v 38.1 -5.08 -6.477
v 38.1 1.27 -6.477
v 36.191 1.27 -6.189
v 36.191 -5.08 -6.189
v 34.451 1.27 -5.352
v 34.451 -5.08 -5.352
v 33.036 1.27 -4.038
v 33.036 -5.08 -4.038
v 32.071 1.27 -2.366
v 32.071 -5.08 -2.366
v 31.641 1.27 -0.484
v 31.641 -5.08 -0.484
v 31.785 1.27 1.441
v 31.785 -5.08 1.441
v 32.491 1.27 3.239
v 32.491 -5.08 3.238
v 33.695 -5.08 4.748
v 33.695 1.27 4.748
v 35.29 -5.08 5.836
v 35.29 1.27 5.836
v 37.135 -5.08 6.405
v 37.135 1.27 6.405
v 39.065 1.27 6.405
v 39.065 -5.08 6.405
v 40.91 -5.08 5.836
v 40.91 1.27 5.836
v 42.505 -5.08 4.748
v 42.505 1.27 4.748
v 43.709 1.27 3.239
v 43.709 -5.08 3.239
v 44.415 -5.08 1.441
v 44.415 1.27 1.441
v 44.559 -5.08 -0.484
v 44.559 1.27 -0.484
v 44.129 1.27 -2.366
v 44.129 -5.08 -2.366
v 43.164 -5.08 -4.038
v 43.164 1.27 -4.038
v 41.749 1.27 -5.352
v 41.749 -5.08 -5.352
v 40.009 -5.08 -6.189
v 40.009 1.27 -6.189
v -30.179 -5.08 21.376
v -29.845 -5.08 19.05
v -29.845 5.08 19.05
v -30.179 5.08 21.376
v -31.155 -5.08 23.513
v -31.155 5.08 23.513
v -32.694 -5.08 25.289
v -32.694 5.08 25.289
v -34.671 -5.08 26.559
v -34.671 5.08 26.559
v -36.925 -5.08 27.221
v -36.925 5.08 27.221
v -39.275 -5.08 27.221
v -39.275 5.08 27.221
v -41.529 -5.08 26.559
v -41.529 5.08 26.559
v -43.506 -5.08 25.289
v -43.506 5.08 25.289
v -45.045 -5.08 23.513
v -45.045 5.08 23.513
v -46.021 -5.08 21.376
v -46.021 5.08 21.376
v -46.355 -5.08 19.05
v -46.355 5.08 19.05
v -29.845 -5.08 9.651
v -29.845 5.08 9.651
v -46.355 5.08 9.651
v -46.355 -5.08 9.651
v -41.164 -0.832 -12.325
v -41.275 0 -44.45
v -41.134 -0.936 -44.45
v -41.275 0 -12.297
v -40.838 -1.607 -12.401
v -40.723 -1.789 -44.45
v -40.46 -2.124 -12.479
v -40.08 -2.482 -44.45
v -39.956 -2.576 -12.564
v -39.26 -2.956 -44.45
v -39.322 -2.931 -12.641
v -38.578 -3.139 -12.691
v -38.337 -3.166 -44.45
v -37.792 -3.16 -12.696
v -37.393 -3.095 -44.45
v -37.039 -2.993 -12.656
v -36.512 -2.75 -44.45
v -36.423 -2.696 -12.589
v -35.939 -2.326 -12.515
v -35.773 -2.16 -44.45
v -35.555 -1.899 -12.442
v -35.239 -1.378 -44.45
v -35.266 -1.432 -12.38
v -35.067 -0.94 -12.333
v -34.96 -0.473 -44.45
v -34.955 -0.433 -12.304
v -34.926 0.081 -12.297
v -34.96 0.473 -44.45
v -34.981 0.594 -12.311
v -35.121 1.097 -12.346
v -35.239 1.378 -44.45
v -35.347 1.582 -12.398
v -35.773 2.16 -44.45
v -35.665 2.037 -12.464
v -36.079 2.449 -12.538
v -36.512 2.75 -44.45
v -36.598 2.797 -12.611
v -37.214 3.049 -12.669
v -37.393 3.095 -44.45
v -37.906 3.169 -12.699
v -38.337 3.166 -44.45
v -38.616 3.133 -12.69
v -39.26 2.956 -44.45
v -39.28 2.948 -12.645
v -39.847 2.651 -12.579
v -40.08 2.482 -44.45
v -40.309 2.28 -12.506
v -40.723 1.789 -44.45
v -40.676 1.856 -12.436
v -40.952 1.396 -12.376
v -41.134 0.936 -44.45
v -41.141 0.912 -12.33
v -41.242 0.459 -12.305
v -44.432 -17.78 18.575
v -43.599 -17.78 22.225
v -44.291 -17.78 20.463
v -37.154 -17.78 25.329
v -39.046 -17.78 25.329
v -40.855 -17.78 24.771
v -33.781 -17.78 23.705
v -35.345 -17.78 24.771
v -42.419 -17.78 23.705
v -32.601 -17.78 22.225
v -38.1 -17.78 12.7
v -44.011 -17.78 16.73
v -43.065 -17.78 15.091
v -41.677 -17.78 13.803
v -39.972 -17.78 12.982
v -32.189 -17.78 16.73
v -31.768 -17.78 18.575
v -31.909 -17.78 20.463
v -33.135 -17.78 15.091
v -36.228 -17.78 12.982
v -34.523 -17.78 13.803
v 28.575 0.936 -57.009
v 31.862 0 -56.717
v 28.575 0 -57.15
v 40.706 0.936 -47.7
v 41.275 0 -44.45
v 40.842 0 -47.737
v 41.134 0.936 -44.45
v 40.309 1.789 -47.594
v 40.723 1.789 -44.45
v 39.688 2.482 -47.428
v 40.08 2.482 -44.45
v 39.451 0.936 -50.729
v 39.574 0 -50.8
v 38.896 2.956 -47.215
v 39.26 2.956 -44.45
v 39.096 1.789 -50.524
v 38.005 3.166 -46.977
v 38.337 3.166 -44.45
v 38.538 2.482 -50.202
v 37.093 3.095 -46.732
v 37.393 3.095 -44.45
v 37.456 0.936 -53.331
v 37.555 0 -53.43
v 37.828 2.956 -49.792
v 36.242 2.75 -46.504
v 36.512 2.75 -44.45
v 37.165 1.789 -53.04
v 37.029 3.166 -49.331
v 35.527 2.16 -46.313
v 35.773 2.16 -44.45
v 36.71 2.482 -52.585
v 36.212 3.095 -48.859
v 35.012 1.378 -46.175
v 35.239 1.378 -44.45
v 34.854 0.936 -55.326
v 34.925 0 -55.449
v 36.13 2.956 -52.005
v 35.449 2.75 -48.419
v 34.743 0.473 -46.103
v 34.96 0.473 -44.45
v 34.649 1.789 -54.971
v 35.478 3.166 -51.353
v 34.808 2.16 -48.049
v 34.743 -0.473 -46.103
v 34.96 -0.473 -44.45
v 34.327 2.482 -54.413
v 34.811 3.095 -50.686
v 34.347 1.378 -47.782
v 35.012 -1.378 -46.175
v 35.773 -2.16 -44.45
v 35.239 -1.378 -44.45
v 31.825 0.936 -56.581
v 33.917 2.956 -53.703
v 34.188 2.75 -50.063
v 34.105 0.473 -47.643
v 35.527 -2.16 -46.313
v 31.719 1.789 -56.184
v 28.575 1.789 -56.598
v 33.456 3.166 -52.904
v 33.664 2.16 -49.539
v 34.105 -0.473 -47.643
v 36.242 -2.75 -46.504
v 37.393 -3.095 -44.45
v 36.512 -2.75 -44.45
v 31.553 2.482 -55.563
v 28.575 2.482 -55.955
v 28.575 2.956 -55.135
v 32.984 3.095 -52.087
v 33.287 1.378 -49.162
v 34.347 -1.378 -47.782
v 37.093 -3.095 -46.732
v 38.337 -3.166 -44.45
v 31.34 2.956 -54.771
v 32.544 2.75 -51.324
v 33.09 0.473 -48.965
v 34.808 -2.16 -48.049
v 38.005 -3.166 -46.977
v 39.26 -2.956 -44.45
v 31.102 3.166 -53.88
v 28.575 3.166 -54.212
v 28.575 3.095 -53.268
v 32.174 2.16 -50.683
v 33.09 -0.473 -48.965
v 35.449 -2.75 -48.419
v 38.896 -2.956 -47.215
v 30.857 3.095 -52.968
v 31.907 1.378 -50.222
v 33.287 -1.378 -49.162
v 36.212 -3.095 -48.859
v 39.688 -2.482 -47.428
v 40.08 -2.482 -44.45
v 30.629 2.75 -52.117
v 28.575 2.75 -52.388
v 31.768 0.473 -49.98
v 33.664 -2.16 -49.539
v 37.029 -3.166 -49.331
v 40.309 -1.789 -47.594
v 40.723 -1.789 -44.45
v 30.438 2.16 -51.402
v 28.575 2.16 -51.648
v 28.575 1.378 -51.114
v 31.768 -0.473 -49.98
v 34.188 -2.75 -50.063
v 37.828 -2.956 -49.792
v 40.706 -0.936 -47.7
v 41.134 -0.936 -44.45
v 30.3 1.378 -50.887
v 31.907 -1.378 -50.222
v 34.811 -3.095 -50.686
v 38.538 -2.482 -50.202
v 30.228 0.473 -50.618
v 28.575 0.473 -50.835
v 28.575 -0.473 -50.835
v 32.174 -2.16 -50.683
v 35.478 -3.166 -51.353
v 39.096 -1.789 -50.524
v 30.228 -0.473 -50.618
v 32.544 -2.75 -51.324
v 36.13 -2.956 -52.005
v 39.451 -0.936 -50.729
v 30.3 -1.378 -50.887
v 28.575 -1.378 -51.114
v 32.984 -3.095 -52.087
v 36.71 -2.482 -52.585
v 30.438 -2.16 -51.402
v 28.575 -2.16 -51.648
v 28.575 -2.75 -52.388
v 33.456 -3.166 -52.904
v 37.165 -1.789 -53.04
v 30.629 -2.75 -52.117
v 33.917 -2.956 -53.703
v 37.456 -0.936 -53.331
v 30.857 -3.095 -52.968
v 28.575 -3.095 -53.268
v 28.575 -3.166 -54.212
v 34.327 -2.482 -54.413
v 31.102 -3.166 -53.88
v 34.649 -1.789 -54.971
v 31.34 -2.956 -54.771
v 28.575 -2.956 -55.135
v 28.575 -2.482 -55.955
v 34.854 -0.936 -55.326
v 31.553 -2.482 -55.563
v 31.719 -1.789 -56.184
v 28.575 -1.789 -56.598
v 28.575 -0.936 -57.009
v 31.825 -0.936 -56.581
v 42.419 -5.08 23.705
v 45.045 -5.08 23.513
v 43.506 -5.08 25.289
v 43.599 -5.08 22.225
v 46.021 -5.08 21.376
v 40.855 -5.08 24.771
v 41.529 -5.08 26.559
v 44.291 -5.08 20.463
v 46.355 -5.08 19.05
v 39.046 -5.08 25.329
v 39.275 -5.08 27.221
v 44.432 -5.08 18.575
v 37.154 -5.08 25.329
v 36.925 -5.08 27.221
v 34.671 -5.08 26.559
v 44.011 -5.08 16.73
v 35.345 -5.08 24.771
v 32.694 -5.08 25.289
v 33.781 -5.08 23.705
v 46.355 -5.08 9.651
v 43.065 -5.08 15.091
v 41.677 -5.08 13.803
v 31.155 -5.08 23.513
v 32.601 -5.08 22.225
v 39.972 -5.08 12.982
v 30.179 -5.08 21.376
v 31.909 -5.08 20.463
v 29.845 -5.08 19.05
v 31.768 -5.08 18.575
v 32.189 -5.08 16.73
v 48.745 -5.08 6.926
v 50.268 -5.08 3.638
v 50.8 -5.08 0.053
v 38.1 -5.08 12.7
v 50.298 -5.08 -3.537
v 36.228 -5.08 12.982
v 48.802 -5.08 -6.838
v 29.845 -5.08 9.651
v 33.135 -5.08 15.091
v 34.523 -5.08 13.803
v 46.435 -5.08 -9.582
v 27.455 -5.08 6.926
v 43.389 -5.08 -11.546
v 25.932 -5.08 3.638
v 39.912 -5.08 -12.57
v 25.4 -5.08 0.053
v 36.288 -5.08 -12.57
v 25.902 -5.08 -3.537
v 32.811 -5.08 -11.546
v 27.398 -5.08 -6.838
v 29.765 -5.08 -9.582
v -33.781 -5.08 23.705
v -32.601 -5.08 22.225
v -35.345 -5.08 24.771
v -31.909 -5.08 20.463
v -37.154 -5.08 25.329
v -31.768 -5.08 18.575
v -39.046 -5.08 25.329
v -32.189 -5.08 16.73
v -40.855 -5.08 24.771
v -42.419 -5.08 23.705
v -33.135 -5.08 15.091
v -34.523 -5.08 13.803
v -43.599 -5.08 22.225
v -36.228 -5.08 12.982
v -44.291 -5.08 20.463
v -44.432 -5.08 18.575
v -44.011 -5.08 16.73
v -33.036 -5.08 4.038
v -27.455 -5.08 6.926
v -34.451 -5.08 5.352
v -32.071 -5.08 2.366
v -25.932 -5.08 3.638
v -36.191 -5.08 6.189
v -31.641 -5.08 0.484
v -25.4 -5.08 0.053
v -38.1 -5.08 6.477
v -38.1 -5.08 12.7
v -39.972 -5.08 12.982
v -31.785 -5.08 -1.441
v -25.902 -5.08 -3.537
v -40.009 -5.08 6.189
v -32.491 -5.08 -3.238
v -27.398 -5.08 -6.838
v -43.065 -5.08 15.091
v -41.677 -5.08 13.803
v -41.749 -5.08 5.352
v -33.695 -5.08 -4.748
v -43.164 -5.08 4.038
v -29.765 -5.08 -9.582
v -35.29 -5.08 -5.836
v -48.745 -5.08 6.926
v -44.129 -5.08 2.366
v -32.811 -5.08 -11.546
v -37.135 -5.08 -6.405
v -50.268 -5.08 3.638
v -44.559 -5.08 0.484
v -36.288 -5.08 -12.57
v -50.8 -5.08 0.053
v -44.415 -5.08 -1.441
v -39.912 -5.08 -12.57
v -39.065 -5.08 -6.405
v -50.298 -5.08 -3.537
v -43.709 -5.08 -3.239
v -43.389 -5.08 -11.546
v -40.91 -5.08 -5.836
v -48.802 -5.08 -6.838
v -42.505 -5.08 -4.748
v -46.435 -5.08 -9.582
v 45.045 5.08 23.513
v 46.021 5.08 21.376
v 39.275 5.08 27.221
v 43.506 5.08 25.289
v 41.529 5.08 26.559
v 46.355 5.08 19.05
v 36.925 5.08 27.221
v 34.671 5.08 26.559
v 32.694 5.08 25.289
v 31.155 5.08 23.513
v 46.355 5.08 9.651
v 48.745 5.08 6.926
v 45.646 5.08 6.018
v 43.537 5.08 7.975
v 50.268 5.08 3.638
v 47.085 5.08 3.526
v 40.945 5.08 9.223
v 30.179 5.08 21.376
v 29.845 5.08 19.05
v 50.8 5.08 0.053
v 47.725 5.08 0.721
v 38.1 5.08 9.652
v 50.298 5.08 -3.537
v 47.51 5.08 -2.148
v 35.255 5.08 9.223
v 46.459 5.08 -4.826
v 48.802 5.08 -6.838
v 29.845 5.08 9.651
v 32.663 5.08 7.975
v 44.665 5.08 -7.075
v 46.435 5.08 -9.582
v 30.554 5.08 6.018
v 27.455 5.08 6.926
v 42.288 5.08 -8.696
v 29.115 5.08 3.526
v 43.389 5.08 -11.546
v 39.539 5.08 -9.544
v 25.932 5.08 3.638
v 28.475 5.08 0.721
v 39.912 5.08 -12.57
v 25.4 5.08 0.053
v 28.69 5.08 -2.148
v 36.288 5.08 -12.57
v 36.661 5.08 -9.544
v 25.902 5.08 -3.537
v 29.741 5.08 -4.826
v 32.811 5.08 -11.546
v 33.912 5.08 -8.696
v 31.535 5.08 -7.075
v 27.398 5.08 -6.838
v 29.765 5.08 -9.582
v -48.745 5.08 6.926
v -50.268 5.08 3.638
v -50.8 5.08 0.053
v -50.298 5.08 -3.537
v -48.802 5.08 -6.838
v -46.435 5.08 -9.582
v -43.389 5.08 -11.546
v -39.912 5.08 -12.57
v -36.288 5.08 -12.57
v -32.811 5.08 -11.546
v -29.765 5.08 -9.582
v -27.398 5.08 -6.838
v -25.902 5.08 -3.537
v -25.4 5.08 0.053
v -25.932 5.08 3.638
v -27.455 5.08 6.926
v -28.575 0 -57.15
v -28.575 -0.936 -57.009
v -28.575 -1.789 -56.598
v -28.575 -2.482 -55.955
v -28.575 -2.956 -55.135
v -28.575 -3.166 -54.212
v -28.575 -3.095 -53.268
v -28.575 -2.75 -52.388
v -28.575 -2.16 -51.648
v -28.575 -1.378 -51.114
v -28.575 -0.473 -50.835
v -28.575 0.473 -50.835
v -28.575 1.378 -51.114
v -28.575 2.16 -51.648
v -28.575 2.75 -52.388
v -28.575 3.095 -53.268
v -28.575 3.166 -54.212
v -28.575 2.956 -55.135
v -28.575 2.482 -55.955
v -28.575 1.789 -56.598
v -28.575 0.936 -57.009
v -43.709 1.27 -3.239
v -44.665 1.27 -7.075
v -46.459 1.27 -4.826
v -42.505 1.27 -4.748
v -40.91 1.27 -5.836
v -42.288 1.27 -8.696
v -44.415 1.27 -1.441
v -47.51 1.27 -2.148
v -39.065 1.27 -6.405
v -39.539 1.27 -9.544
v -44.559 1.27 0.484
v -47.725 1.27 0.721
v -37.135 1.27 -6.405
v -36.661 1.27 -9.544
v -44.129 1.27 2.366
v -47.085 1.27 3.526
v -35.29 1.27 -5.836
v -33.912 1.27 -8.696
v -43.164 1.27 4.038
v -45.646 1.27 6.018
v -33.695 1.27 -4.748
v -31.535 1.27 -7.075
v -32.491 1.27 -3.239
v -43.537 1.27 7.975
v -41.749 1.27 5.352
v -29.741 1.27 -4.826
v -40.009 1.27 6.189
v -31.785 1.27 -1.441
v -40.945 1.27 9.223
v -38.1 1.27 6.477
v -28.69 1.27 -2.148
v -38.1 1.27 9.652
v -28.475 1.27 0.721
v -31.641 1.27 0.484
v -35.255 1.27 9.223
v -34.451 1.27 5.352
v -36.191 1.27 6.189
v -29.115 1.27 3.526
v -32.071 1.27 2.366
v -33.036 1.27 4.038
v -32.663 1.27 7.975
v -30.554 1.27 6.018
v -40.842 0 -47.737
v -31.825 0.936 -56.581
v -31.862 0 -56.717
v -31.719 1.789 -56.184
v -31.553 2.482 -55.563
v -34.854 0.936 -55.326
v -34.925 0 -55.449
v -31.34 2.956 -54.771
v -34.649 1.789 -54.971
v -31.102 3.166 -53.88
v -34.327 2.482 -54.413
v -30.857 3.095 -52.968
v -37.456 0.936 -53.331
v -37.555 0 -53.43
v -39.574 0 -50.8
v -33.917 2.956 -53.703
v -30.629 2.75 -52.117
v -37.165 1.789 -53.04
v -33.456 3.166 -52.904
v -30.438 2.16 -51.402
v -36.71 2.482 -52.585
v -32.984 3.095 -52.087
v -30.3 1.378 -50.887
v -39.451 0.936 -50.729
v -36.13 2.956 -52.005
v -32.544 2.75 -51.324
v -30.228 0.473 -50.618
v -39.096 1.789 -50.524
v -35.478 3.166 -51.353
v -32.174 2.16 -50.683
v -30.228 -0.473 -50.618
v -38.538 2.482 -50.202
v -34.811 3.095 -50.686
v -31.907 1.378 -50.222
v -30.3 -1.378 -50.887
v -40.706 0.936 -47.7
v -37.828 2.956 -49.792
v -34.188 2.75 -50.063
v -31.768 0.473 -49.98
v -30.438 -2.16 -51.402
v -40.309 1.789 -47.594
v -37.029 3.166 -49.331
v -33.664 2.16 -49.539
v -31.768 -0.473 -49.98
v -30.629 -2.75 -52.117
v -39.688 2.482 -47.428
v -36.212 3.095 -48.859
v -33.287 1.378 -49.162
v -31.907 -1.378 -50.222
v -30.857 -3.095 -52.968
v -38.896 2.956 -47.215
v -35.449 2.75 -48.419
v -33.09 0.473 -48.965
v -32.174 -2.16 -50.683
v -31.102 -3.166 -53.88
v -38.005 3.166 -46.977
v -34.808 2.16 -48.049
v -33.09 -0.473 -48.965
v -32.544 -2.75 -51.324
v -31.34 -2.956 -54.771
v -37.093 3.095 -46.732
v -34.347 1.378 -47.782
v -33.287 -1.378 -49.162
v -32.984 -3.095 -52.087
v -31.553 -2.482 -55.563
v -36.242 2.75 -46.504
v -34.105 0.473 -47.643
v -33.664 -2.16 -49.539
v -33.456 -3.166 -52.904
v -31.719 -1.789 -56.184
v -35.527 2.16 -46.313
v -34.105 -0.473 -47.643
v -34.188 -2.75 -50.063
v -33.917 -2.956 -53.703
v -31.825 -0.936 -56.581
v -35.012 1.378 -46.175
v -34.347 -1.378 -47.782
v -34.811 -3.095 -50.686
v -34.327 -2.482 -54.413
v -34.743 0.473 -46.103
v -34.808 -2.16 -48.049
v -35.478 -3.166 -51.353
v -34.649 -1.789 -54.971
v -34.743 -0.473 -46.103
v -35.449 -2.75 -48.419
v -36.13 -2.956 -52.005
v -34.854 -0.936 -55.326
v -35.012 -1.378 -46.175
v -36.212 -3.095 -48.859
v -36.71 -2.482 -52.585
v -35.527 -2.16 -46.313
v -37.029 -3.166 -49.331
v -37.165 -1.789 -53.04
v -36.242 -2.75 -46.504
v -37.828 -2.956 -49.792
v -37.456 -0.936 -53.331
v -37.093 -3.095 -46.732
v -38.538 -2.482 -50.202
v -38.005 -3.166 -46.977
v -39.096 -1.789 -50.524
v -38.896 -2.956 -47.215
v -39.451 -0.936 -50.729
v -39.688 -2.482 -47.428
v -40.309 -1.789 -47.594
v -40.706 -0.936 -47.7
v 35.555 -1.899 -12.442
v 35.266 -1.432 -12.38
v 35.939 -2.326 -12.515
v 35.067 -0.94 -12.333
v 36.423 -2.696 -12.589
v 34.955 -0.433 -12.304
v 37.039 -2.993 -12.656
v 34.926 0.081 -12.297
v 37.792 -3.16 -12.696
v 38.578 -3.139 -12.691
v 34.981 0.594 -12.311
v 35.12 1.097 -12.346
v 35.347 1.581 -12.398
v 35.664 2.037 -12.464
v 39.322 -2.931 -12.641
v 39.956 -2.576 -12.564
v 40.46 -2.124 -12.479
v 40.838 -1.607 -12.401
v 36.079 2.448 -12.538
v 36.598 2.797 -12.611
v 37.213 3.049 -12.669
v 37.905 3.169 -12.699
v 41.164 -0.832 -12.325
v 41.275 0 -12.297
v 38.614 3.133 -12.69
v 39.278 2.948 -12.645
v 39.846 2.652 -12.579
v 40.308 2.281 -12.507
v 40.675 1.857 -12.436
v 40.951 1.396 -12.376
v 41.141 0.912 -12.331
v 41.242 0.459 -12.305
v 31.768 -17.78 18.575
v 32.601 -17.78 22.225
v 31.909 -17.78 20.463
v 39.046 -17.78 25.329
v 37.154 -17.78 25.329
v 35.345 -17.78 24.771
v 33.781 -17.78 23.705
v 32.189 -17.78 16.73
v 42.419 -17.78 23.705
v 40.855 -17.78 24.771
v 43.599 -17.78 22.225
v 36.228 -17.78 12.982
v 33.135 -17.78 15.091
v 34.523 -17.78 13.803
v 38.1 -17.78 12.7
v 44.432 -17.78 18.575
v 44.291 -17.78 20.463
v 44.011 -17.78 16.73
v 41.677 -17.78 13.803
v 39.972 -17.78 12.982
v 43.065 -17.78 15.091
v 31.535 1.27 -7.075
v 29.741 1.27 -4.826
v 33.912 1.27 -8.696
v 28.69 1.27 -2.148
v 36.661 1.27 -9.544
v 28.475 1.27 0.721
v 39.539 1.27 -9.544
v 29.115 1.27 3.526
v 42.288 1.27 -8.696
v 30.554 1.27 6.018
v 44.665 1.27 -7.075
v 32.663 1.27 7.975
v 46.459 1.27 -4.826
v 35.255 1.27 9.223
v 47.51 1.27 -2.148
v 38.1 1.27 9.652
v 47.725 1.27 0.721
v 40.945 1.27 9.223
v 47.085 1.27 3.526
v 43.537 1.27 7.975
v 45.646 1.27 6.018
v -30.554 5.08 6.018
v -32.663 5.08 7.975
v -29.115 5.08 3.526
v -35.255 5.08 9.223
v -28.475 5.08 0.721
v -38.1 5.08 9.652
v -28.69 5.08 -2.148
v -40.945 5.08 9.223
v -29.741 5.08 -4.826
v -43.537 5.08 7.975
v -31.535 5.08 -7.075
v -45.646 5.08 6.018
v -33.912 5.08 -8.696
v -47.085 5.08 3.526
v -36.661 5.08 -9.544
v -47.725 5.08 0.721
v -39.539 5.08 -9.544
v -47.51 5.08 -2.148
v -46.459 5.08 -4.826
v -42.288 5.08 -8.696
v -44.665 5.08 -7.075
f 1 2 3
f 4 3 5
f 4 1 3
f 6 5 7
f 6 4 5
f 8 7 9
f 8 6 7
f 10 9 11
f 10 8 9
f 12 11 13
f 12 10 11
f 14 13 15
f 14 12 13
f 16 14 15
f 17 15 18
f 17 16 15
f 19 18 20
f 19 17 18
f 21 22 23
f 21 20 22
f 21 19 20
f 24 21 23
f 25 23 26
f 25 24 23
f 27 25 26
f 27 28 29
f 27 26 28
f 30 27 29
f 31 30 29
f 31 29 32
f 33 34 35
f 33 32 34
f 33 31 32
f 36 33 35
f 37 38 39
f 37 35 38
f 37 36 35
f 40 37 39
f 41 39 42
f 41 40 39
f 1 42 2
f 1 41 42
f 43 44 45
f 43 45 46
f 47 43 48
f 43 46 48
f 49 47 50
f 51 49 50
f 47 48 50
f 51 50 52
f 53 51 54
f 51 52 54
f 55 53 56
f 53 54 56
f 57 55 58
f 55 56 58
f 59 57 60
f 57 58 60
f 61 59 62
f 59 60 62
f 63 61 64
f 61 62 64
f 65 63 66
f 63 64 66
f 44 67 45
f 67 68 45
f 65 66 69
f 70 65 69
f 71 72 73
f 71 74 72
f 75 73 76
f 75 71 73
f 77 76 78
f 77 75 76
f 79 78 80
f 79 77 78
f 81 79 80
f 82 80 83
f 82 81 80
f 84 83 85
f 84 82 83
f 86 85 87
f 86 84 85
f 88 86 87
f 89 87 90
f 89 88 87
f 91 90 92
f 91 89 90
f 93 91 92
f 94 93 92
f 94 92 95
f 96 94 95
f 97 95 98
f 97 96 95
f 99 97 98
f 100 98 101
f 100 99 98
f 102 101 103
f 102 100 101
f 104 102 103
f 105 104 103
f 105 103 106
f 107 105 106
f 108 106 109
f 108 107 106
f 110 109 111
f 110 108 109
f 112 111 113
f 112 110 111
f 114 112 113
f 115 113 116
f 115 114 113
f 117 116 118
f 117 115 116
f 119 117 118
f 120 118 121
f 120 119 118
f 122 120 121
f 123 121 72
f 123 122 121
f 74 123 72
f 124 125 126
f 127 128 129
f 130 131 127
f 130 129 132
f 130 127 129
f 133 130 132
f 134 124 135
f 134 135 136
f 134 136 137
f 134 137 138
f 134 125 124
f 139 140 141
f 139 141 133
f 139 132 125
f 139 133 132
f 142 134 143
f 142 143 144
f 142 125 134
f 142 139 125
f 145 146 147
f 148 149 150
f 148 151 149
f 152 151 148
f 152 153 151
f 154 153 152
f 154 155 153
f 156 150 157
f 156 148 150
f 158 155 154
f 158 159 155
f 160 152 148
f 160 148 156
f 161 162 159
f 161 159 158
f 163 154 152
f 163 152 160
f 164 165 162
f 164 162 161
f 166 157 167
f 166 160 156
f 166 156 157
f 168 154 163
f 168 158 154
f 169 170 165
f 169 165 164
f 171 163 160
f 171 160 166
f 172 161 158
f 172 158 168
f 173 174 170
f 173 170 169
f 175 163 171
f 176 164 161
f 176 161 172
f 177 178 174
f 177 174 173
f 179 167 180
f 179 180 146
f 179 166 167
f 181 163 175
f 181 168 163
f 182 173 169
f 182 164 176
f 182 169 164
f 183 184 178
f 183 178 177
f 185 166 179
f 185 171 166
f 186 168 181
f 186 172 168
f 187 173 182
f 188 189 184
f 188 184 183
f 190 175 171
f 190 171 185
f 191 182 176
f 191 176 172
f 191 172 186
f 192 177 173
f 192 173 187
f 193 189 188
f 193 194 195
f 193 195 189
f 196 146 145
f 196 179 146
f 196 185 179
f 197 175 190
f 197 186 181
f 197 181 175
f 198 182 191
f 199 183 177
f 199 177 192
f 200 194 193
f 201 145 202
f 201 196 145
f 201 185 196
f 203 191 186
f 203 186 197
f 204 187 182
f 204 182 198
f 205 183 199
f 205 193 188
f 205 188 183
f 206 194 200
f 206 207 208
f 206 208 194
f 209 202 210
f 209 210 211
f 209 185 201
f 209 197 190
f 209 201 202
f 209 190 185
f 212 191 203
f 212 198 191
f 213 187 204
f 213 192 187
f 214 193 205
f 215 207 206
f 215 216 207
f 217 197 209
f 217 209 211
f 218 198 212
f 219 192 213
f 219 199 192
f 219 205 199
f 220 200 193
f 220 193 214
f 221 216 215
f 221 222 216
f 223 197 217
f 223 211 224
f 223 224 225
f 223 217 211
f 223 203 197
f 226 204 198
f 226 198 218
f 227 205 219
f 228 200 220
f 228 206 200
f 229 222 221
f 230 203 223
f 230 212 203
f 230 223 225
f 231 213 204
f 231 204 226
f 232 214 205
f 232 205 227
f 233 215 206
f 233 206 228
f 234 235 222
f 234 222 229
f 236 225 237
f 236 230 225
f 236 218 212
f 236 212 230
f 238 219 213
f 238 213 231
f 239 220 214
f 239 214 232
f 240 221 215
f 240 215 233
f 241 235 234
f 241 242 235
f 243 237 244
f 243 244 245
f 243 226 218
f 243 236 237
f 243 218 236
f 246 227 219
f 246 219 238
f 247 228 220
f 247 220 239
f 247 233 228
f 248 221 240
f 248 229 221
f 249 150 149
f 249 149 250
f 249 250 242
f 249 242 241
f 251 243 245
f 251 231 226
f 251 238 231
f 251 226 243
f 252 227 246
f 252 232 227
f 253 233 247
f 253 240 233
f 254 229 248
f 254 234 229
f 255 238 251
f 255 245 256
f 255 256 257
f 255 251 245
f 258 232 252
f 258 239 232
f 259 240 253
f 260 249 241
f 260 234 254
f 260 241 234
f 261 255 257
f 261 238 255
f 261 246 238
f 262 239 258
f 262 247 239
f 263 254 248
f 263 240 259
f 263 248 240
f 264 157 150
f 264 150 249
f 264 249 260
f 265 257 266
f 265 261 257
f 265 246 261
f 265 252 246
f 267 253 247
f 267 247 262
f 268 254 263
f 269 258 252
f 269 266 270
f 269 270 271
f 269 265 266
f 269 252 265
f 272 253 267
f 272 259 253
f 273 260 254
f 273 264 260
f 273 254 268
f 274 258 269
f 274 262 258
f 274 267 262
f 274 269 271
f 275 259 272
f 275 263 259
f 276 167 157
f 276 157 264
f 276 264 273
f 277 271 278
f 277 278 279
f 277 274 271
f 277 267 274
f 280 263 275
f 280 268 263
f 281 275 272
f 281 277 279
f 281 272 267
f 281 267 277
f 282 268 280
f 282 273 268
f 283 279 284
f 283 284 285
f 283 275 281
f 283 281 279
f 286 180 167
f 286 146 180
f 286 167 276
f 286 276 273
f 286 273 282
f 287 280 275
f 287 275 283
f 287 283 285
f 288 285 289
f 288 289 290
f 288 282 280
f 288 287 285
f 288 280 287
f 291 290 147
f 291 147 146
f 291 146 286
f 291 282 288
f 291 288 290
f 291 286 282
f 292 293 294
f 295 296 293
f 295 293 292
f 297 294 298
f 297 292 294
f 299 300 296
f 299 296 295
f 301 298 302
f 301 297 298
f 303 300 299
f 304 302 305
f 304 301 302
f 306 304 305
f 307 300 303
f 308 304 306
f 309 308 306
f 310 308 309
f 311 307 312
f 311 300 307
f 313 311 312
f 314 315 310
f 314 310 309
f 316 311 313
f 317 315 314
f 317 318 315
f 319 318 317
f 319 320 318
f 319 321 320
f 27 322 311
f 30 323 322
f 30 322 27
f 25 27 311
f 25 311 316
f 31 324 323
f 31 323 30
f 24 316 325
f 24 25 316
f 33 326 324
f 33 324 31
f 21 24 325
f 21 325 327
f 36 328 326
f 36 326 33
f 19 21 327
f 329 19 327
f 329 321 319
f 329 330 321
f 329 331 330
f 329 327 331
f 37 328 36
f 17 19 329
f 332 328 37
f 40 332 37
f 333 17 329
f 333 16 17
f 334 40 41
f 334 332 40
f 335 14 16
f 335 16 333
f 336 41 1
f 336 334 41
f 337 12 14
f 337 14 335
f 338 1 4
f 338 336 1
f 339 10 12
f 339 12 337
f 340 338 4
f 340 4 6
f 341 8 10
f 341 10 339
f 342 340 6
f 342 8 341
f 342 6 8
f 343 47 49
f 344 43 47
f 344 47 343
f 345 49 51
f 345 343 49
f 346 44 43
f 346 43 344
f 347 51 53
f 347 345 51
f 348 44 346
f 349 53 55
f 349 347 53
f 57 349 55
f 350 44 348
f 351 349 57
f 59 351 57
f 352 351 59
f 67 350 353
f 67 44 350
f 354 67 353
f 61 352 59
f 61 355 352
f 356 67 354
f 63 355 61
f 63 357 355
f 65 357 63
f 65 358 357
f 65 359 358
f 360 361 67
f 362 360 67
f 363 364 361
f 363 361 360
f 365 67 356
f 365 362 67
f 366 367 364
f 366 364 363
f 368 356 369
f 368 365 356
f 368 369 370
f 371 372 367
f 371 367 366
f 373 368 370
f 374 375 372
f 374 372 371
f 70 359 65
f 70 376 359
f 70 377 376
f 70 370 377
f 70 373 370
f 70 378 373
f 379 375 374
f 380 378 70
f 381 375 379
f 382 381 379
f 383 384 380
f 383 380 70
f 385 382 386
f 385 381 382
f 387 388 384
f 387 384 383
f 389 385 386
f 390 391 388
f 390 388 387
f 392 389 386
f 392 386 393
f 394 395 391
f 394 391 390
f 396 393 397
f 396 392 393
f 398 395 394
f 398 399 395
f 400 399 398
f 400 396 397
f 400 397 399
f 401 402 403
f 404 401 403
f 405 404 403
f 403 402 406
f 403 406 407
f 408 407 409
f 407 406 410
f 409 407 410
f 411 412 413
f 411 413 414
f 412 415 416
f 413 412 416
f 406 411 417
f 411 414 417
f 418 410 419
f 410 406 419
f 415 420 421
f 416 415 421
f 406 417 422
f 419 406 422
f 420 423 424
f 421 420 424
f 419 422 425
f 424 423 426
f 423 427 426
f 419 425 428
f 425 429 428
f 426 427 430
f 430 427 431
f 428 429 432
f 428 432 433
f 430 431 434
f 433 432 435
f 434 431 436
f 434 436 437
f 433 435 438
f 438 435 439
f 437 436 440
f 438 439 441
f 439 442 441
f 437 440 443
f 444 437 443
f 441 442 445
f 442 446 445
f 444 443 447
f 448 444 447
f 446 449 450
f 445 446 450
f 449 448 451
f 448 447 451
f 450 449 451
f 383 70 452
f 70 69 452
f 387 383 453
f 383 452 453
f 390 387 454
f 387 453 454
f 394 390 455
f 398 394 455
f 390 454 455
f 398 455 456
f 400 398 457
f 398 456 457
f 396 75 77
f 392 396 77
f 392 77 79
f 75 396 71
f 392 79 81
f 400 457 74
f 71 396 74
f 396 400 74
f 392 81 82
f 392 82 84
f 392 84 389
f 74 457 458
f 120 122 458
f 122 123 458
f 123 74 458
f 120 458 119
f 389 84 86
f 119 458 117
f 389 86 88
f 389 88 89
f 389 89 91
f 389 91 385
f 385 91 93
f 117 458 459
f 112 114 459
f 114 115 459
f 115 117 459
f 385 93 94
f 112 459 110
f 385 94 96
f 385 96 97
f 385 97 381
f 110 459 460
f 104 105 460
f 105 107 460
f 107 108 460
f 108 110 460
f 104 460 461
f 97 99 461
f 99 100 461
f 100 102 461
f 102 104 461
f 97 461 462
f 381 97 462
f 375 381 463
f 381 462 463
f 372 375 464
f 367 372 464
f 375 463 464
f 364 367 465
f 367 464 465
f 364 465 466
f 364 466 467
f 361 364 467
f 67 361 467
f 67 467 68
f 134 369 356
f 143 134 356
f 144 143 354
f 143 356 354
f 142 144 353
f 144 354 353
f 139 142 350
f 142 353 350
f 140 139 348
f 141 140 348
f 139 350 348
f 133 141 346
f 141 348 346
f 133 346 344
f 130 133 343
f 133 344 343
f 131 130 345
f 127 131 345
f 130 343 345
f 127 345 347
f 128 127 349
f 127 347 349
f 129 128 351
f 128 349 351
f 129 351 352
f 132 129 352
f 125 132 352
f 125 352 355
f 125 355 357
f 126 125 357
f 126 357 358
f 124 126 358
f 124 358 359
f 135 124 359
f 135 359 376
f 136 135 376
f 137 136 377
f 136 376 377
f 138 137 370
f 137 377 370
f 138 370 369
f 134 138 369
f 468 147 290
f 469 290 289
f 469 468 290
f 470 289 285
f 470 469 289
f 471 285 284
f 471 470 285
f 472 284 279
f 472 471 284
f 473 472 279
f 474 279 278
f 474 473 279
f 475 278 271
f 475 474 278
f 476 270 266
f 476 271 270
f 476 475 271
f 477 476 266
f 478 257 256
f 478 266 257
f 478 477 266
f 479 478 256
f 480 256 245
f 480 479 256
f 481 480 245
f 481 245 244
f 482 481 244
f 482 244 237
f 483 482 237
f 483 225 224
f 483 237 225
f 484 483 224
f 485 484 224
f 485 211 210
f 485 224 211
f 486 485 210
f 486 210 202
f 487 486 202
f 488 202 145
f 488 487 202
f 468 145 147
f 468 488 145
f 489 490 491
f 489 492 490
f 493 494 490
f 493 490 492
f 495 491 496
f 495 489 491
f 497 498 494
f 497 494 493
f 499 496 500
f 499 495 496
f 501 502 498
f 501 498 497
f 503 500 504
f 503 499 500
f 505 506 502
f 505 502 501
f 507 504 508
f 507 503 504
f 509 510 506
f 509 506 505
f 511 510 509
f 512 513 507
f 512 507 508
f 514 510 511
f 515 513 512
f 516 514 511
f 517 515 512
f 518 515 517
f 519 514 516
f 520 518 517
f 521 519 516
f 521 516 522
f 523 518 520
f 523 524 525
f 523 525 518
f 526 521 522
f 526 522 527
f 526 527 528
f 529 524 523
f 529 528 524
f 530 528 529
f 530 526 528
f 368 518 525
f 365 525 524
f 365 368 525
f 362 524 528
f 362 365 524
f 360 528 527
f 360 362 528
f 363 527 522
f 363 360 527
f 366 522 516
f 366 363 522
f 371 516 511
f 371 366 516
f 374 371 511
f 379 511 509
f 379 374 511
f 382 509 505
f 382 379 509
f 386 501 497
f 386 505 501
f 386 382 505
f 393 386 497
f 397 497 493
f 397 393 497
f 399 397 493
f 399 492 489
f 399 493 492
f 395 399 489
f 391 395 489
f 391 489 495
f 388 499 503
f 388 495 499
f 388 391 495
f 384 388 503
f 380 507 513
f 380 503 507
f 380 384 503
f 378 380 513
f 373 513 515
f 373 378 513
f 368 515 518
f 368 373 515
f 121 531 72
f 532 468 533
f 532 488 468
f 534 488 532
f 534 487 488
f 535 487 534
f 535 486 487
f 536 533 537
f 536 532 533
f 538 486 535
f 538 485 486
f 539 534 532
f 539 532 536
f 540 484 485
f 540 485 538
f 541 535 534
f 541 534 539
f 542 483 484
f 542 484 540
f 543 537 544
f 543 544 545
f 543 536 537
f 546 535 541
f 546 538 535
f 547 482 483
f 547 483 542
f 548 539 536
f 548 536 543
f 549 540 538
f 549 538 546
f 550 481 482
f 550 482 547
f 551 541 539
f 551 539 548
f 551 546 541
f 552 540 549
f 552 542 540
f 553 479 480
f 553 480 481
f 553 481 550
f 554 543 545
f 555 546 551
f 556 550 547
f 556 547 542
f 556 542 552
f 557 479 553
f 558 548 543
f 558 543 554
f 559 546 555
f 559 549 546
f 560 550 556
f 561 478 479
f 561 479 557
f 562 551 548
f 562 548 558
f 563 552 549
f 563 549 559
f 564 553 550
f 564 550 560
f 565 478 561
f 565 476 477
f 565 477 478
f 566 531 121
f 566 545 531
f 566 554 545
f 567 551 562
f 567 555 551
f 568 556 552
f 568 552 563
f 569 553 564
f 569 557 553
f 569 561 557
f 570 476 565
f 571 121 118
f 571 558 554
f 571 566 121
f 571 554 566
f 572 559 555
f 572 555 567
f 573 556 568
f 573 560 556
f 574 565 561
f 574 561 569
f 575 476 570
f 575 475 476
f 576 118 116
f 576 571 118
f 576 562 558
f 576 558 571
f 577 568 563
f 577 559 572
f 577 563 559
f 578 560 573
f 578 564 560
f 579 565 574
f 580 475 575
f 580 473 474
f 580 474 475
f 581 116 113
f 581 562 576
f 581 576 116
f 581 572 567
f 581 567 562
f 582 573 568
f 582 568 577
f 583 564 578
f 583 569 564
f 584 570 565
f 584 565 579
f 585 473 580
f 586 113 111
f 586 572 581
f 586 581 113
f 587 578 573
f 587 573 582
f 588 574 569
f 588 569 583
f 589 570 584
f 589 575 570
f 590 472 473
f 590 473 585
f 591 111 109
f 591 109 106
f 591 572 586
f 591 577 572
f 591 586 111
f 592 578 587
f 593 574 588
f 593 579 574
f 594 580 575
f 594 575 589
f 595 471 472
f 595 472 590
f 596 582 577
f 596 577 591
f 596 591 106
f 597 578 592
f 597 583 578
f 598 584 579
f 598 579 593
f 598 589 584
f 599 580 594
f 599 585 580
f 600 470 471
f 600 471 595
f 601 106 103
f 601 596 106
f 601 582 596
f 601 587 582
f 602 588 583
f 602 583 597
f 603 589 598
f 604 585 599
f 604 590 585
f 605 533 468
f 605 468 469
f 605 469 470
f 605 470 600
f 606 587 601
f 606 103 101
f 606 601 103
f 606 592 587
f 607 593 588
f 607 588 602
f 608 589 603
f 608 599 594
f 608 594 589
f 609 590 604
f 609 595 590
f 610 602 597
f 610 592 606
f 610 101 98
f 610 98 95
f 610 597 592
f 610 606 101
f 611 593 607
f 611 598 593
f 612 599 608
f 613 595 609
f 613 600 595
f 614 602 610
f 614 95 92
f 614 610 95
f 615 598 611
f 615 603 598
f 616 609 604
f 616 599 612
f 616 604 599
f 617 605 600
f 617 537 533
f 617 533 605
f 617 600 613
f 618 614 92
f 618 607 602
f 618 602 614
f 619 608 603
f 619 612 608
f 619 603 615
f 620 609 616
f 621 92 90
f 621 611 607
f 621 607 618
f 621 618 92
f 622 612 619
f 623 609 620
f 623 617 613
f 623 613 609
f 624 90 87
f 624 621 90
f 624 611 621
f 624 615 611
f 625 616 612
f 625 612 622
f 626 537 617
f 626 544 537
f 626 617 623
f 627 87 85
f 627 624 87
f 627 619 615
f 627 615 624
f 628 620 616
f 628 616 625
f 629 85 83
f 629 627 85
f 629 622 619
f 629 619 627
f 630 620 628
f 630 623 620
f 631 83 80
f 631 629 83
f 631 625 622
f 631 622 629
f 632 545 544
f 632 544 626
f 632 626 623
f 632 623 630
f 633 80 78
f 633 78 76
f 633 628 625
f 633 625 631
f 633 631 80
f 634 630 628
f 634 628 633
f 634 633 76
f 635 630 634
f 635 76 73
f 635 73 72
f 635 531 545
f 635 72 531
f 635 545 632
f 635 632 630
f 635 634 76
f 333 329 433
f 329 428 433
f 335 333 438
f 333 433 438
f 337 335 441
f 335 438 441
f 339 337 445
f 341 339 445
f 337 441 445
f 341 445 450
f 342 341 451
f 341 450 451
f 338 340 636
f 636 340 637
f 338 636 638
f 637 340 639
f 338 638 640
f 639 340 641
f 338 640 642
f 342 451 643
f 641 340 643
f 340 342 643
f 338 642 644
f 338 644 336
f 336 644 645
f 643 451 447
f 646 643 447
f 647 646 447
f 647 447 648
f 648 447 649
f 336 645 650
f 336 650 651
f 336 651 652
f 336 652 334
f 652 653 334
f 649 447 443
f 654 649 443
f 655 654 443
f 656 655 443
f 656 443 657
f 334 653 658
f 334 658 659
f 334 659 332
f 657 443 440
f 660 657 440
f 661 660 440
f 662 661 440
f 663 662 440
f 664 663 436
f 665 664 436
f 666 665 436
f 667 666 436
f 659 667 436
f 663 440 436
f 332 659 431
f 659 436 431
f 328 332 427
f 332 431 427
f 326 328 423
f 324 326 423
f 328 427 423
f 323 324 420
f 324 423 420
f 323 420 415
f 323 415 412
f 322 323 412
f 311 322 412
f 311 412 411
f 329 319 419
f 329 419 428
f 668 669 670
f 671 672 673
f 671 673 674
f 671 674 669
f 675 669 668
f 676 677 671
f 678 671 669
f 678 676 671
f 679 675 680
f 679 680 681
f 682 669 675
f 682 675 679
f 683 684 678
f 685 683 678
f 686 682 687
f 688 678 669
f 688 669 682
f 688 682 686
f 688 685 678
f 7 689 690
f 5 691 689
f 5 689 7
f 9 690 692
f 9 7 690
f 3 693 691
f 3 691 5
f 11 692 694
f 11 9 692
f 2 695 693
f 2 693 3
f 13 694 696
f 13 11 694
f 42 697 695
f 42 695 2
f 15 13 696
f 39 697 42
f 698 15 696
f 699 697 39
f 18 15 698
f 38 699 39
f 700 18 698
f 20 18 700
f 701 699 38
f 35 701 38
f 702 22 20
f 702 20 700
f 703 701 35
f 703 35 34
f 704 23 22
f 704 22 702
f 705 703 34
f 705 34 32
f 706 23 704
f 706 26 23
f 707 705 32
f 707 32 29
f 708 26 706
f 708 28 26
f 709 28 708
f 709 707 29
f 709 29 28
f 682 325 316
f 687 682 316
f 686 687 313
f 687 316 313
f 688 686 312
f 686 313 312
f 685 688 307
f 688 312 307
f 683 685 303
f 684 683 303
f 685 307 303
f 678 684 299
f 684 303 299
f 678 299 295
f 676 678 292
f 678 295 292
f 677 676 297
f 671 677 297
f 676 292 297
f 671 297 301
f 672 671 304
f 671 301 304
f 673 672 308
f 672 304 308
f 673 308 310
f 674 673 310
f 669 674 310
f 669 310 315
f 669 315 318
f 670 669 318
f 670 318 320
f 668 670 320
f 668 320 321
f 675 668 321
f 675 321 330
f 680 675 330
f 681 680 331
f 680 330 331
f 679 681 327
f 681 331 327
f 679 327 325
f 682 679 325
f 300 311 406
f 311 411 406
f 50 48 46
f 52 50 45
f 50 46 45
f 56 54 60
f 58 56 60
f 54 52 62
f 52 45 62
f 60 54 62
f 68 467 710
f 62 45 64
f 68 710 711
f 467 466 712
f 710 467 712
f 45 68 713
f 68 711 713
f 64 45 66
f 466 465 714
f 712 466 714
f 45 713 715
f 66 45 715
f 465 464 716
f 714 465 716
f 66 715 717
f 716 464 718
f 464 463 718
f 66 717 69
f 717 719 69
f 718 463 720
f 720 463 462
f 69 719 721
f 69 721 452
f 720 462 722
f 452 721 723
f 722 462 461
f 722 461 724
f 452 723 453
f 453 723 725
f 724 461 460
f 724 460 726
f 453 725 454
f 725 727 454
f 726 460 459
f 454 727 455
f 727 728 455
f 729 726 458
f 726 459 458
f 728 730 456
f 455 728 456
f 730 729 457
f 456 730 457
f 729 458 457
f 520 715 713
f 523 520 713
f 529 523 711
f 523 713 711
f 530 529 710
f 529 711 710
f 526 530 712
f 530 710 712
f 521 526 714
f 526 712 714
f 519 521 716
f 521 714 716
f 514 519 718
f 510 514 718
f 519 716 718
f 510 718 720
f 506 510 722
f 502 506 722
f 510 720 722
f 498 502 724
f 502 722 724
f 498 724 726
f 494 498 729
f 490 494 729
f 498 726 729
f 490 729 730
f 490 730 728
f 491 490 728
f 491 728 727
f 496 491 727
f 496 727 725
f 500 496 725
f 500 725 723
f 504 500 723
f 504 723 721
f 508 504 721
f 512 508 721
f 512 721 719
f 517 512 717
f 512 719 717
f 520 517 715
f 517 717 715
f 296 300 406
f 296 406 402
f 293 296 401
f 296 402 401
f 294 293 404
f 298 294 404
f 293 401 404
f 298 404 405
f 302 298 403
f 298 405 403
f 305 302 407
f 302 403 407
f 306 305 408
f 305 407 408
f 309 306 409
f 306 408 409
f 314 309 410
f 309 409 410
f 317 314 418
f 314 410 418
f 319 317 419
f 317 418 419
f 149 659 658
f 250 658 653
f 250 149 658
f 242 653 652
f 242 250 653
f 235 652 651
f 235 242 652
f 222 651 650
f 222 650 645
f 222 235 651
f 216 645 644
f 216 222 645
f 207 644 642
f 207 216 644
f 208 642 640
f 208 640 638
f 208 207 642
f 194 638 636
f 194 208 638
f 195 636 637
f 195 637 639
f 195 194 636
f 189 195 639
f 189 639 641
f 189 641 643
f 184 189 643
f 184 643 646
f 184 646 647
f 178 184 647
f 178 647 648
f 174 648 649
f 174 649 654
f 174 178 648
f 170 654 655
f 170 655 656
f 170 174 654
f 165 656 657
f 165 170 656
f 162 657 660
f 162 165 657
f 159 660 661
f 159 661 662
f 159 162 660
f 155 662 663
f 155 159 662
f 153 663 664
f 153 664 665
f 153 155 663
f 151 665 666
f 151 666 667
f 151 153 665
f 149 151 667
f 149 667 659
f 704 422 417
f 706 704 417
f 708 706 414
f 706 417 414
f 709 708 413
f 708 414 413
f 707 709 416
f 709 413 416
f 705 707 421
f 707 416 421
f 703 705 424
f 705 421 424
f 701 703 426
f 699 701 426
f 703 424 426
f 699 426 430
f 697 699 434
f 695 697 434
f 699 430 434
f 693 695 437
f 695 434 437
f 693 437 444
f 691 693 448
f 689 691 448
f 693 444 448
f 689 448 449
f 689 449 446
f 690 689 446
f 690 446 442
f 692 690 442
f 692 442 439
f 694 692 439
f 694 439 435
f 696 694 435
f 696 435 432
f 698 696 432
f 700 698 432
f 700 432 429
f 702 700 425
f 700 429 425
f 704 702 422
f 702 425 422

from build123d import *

# Parameters (mm, degrees)
SKETCH1_R             = 6.477
BOSS_EXTRUDE1_DEPTH   = 5.08
BOSS_EXTRUDE1_2_DEPTH = 5.08
SKETCH2_R             = 6.35
BOSS_EXTRUDE2_DEPTH   = 12.7
SKETCH3_R             = 9.652
CUT_EXTRUDE1_DEPTH    = 3.81
SKETCH5_R             = 3.175


with BuildPart() as part:
    # Sketch1 → Boss-Extrude1 (new, symmetric)
    with BuildSketch(Plane(origin=(0, 0, 0), x_dir=(1, 0, 0), z_dir=(0, 1, 0))):
        with BuildLine():
            Line((-46.355, -19.05), (-46.355, -9.651164438))
            ThreePointArc((-46.355, -9.651164438), (-38.1, 12.7), (-29.845, -9.651164438))
            Line((-29.845, -9.651164438), (-29.845, -19.05))
            ThreePointArc((-29.845, -19.05), (-38.1, -27.305), (-46.355, -19.05))
        make_face()
        with Locations(Location((-38.1, 0, 0), (0, 0, 270))):
            Circle(SKETCH1_R, mode=Mode.SUBTRACT)
    extrude(amount=BOSS_EXTRUDE1_DEPTH, both=True)



with BuildPart() as body_2:
    # Sketch1 → Boss-Extrude1 2 (new, symmetric)
    with BuildSketch(Plane(origin=(0, 0, 0), x_dir=(1, 0, 0), z_dir=(0, 1, 0))):
        with BuildLine():
            Line((29.845, -19.05), (29.845, -9.651164438))
            ThreePointArc((29.845, -9.651164438), (38.1, 12.7), (46.355, -9.651164438))
            Line((46.355, -9.651164438), (46.355, -19.05))
            ThreePointArc((46.355, -19.05), (38.1, -27.305), (29.845, -19.05))
        make_face()
        with Locations(Location((38.1, 0, 0), (0, 0, 90))):
            Circle(SKETCH1_R, mode=Mode.SUBTRACT)
    extrude(amount=BOSS_EXTRUDE1_2_DEPTH, both=True)


with BuildPart() as part_1:
    add(part.part)

    add(body_2.part)  # Boss-Extrude2 merges body 2
    # Sketch2 → Boss-Extrude2 (add)
    with BuildSketch(Plane.XZ.offset(5.08)):
        with Locations(Location((-38.1, 19.05, 0), (0, 0, 270))):
            Circle(SKETCH2_R)
        with Locations(Location((38.1, 19.05, 0), (0, 0, 270))):
            Circle(SKETCH2_R)
    extrude(amount=BOSS_EXTRUDE2_DEPTH)

    # Sketch3 → Cut-Extrude1 (cut)
    with BuildSketch(Plane(origin=(0, 5.08, 0), x_dir=(1, 0, 0), z_dir=(0, 1, 0))):
        with Locations(Location((-38.1, 0, 0), (0, 0, 270))):
            Circle(SKETCH3_R)
        with Locations(Location((38.1, 0, 0), (0, 0, 270))):
            Circle(SKETCH3_R)
    extrude(amount=-CUT_EXTRUDE1_DEPTH, mode=Mode.SUBTRACT)

    # Sweep1: sweep along a path in Sketch6
    with BuildLine(Plane(origin=(0, 0, 0), x_dir=(1, 0, 0), z_dir=(0, 1, 0))) as sweep1_path:
        Line((38.1, 12.192), (38.1, 44.45))
        ThreePointArc((38.1, 44.45), (35.310192091, 51.185192091), (28.575, 53.975))
        Line((28.575, 53.975), (-28.575, 53.975))
        ThreePointArc((-28.575, 53.975), (-35.310192091, 51.185192091), (-38.1, 44.45))
        Line((-38.1, 44.45), (-38.1, 12.192))
    # Sketch5 → Sweep1 (sweep)
    with BuildSketch(Plane.XY.offset(-12.192)):
        with Locations((38.1, 0)):
            Circle(SKETCH5_R)
    sweep(path=sweep1_path.line)


solid = part_1.part
